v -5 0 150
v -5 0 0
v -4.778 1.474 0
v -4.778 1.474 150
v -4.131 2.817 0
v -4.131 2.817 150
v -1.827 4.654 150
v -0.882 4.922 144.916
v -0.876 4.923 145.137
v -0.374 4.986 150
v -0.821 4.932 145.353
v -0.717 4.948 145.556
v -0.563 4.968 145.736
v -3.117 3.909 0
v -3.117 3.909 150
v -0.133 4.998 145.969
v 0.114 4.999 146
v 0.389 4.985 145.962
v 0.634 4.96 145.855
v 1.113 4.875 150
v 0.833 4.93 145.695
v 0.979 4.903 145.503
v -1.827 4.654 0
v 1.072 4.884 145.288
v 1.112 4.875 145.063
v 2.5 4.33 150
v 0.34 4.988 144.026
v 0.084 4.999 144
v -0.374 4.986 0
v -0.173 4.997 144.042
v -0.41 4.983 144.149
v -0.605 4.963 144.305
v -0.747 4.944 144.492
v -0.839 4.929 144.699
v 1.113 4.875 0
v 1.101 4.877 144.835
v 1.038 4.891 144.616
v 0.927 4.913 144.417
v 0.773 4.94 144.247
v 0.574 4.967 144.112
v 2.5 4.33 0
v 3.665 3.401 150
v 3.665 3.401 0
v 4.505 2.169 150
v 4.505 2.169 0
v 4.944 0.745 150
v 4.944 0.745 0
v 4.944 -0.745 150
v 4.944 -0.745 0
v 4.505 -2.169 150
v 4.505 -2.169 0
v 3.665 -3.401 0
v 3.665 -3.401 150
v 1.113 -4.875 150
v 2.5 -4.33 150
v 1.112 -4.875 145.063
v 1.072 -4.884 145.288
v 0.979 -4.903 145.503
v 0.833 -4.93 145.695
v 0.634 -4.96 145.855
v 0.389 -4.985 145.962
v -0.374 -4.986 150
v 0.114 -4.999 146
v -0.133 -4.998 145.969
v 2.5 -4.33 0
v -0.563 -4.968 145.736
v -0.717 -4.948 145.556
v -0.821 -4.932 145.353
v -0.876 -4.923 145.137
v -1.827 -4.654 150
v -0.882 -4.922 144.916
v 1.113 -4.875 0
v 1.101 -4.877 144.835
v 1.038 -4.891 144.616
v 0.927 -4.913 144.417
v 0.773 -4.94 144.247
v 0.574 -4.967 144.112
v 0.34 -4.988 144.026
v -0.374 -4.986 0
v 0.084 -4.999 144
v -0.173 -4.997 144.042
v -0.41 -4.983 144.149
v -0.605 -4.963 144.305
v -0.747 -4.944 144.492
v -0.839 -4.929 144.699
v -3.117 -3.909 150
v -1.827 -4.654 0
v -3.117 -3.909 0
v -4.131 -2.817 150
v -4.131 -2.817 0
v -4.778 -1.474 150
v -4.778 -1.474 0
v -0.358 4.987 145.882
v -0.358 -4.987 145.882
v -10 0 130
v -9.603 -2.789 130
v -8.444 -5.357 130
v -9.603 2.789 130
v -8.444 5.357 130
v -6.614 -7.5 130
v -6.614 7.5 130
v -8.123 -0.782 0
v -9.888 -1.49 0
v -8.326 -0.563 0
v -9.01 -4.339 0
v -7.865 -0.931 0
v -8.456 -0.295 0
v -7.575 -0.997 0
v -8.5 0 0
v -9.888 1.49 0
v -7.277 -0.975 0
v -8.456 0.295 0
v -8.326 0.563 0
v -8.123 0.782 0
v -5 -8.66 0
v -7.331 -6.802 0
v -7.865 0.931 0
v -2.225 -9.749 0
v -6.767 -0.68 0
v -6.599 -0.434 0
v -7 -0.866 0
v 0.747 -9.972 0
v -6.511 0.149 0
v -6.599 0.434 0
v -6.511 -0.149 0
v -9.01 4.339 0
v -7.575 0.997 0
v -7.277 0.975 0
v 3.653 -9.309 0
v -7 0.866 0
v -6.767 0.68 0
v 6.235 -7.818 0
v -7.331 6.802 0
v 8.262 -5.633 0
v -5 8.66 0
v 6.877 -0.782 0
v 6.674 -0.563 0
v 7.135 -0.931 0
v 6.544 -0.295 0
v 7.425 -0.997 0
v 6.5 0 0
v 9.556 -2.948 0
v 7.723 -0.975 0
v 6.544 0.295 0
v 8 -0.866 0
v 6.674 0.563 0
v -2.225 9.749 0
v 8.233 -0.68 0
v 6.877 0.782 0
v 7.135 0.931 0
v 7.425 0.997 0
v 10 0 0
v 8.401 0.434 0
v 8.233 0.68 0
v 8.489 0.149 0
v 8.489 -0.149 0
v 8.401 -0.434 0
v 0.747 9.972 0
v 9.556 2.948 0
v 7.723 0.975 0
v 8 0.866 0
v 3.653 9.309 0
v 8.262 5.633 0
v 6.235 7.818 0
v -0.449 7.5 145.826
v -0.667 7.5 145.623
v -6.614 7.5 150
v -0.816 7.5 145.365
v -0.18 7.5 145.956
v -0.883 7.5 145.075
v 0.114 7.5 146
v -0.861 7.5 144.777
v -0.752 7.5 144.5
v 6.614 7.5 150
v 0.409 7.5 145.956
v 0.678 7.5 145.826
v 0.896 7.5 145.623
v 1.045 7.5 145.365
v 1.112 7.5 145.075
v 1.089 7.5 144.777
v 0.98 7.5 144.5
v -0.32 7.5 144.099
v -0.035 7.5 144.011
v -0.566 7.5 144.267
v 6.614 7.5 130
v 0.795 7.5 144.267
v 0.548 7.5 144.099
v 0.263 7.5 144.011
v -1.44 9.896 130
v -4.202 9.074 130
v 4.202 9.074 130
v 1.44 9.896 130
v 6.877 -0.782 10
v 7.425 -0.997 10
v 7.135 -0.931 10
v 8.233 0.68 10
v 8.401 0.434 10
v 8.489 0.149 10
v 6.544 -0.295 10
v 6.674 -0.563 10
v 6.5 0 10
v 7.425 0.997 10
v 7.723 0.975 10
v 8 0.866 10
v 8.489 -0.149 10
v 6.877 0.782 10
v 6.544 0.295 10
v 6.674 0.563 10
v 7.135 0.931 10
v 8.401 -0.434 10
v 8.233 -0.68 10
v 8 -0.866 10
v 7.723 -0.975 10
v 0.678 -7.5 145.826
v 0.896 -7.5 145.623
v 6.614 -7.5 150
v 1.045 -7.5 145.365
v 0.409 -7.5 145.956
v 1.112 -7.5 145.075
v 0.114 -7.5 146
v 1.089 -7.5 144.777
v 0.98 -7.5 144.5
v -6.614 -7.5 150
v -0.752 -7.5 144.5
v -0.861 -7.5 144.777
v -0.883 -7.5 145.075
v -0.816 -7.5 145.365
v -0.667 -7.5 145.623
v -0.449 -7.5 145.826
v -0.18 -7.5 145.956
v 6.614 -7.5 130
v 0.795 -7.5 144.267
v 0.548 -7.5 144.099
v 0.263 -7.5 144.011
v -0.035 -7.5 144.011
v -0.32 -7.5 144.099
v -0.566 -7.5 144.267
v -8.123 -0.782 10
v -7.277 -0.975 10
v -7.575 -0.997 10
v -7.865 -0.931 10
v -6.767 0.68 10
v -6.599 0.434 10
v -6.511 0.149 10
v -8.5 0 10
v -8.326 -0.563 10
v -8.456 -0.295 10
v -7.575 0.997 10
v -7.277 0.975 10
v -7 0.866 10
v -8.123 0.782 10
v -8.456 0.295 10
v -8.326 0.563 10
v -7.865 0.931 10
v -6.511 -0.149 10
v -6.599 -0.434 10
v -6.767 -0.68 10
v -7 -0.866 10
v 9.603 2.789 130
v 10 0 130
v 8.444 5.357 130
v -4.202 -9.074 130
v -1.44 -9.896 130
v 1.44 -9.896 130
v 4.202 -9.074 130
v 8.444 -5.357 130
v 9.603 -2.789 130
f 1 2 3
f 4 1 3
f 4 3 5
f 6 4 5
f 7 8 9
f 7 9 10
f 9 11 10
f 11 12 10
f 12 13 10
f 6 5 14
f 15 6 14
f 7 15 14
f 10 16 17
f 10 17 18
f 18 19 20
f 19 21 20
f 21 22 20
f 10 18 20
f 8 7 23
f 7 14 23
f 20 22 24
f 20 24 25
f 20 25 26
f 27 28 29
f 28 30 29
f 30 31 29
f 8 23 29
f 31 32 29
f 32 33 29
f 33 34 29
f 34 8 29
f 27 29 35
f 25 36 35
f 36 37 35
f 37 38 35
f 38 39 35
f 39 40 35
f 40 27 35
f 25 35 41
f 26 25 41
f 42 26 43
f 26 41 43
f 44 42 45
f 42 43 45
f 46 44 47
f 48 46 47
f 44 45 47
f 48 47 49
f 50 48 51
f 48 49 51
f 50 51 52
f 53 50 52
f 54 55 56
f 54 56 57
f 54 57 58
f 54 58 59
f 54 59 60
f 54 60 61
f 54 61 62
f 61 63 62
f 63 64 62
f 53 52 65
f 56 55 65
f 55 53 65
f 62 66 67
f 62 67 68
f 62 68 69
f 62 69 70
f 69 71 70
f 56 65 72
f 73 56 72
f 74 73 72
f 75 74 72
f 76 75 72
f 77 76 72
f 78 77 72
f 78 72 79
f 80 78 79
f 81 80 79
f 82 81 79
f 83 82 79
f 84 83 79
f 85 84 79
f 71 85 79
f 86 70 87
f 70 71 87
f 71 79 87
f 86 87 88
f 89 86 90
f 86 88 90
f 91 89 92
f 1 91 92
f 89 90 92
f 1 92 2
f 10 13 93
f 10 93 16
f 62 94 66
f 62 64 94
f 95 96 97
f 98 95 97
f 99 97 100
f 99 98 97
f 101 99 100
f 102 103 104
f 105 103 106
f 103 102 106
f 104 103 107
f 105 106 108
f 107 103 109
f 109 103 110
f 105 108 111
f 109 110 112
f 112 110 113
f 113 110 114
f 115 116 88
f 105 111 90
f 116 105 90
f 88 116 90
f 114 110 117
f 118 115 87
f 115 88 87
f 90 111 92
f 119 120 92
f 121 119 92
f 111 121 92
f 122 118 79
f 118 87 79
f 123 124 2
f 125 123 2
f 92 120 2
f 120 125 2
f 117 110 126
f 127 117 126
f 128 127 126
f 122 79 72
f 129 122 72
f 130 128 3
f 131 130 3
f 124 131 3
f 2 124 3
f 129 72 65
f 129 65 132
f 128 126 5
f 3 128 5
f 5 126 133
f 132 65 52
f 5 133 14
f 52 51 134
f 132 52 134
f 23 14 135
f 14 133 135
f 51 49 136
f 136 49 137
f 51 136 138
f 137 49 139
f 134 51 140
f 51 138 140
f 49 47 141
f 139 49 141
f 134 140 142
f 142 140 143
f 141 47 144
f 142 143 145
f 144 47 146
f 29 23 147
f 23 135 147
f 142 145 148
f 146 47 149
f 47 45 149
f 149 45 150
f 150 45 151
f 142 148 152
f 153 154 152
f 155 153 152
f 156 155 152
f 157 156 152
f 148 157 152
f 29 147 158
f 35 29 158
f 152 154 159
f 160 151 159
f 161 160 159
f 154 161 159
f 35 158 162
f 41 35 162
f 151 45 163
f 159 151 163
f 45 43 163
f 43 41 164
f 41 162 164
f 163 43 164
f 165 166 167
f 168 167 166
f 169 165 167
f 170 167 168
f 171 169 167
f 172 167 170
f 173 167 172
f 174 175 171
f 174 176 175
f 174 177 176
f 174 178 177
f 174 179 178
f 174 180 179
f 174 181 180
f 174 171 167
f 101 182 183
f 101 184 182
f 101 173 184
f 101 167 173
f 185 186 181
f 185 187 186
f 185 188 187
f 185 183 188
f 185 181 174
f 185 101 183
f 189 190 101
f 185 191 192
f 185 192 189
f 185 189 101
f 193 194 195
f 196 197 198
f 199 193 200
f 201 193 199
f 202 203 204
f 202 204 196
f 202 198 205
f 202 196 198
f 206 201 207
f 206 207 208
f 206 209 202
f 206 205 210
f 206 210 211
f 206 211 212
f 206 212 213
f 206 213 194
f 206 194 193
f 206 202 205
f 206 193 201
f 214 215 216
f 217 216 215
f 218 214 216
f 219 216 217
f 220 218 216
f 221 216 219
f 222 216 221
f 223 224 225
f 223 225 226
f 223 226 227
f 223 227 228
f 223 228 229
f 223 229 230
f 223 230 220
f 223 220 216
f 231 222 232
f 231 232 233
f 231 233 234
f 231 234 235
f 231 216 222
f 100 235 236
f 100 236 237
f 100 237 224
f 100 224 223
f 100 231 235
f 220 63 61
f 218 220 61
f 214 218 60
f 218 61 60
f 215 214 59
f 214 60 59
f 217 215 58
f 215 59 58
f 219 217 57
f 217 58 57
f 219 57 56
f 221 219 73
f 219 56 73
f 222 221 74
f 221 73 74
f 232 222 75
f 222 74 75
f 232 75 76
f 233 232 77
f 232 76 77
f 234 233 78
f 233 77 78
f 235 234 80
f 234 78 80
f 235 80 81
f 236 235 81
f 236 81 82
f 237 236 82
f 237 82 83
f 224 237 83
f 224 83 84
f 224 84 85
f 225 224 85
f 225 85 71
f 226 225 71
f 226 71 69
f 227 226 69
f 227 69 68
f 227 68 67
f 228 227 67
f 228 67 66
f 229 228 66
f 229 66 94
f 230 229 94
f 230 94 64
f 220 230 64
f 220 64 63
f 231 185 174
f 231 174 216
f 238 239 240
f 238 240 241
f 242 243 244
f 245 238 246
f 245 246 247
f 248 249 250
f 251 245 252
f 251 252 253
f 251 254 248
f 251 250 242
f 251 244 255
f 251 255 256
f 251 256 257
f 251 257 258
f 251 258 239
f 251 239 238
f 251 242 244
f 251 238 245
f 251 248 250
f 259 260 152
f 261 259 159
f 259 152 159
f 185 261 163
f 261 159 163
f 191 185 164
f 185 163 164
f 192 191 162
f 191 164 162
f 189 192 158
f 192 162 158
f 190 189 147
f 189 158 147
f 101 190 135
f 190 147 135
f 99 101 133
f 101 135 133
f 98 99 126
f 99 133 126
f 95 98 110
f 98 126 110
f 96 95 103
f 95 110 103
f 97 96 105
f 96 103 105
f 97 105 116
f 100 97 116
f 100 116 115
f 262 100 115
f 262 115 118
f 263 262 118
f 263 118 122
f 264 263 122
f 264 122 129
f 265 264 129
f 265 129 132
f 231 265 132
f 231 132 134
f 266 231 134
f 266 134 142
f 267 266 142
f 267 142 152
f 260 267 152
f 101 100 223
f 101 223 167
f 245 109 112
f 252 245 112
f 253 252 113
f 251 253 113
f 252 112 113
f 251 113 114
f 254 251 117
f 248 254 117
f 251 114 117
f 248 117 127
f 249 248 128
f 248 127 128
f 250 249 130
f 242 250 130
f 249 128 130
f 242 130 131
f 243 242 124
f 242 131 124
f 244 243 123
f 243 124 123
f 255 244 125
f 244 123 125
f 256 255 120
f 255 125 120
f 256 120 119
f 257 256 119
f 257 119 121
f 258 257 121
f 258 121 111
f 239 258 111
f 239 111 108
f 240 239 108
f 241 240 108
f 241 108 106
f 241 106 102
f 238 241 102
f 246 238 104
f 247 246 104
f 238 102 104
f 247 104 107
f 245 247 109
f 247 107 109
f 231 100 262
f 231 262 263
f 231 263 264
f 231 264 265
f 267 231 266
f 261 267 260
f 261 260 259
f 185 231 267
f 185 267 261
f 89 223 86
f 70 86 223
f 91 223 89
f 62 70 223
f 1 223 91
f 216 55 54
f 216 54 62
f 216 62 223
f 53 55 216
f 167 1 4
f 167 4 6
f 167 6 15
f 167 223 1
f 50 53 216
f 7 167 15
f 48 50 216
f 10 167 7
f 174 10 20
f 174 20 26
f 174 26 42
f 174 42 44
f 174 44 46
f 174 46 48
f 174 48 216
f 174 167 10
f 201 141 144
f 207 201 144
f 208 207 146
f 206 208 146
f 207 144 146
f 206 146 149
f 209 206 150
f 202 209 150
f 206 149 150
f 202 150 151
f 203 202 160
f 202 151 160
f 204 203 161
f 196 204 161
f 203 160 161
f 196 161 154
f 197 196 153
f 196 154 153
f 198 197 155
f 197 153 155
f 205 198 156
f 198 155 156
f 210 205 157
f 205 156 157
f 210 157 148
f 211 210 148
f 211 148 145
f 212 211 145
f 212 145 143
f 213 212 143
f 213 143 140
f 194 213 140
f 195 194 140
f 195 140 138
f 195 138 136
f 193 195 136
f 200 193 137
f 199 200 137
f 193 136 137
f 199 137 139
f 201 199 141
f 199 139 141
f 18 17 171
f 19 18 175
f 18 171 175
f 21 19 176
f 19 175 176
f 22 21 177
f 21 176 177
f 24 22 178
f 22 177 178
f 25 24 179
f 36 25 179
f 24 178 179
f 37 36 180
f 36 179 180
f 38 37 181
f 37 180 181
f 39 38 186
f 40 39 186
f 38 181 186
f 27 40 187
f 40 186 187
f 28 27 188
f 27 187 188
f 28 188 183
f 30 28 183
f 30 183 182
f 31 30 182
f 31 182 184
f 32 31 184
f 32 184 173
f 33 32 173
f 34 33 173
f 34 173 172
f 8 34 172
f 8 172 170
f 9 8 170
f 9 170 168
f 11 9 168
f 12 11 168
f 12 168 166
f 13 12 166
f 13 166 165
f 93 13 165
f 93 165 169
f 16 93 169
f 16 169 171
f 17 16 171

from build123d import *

# Parameters (mm, degrees)
SKETCH1_R           = 10
BOSS_EXTRUDE1_DEPTH = 150
CUT_EXTRUDE1_START  = -20
CUT_EXTRUDE1_DEPTH  = 20
SKETCH3_3_R         = 1
CUT_EXTRUDE4_DEPTH  = 152.348108677
SKETCH7_R           = 1
CUT_EXTRUDE5_DEPTH  = 10
SKETCH8_R           = 5
CUT_EXTRUDE6_DEPTH  = 151.665191733


with BuildPart() as part:
    # Sketch1 → Boss-Extrude1 (new body)
    with BuildSketch(Plane.XY):
        Circle(SKETCH1_R)
    extrude(amount=BOSS_EXTRUDE1_DEPTH)

    # Sketch2 → Cut-Extrude1 (cut)
    with BuildSketch(Plane.XY.offset(150).offset(CUT_EXTRUDE1_START)):
        with BuildLine():
            ThreePointArc((6.614378278, 7.5), (0, 10), (-6.614378278, 7.5))
            Line((-6.614378278, 7.5), (6.614378278, 7.5))
        make_face()
        with BuildLine():
            Line((-6.614378278, -7.5), (-6.614378278, 7.5))
            ThreePointArc((-6.614378278, 7.5), (-10, 0), (-6.614378278, -7.5))
        make_face()
        with BuildLine():
            ThreePointArc((6.614378278, -7.5), (10, 0), (6.614378278, 7.5))
            Line((6.614378278, 7.5), (6.614378278, -7.5))
        make_face()
        with BuildLine():
            Line((6.614378278, -7.5), (-6.614378278, -7.5))
            ThreePointArc((-6.614378278, -7.5), (0, -10), (6.614378278, -7.5))
        make_face()
    extrude(amount=CUT_EXTRUDE1_DEPTH, mode=Mode.SUBTRACT)

    # Sketch3<3> → Cut-Extrude4 (cut, through all)
    with BuildSketch(Plane(origin=(0, 7.5, 0), x_dir=(1, 0, 0), z_dir=(0, 1, 0))):
        with Locations((0.114378278, -145)):
            Circle(SKETCH3_3_R)
    extrude(amount=-CUT_EXTRUDE4_DEPTH, mode=Mode.SUBTRACT)

    # Sketch7 → Cut-Extrude5 (cut)
    with BuildSketch(Plane(origin=(0, 0, 0), x_dir=(-1, 0, 0), z_dir=(0, 0, -1))):
        with Locations((7.5, 0)):
            Circle(SKETCH7_R)
        with Locations((-7.5, 0)):
            Circle(SKETCH7_R)
    extrude(amount=-CUT_EXTRUDE5_DEPTH, mode=Mode.SUBTRACT)

    # Sketch8 → Cut-Extrude6 (cut, through all)
    with BuildSketch(Plane(origin=(0, 0, 0), x_dir=(-1, 0, 0), z_dir=(0, 0, -1))):
        Circle(SKETCH8_R)
    extrude(amount=-CUT_EXTRUDE6_DEPTH, mode=Mode.SUBTRACT)


solid = part.part
